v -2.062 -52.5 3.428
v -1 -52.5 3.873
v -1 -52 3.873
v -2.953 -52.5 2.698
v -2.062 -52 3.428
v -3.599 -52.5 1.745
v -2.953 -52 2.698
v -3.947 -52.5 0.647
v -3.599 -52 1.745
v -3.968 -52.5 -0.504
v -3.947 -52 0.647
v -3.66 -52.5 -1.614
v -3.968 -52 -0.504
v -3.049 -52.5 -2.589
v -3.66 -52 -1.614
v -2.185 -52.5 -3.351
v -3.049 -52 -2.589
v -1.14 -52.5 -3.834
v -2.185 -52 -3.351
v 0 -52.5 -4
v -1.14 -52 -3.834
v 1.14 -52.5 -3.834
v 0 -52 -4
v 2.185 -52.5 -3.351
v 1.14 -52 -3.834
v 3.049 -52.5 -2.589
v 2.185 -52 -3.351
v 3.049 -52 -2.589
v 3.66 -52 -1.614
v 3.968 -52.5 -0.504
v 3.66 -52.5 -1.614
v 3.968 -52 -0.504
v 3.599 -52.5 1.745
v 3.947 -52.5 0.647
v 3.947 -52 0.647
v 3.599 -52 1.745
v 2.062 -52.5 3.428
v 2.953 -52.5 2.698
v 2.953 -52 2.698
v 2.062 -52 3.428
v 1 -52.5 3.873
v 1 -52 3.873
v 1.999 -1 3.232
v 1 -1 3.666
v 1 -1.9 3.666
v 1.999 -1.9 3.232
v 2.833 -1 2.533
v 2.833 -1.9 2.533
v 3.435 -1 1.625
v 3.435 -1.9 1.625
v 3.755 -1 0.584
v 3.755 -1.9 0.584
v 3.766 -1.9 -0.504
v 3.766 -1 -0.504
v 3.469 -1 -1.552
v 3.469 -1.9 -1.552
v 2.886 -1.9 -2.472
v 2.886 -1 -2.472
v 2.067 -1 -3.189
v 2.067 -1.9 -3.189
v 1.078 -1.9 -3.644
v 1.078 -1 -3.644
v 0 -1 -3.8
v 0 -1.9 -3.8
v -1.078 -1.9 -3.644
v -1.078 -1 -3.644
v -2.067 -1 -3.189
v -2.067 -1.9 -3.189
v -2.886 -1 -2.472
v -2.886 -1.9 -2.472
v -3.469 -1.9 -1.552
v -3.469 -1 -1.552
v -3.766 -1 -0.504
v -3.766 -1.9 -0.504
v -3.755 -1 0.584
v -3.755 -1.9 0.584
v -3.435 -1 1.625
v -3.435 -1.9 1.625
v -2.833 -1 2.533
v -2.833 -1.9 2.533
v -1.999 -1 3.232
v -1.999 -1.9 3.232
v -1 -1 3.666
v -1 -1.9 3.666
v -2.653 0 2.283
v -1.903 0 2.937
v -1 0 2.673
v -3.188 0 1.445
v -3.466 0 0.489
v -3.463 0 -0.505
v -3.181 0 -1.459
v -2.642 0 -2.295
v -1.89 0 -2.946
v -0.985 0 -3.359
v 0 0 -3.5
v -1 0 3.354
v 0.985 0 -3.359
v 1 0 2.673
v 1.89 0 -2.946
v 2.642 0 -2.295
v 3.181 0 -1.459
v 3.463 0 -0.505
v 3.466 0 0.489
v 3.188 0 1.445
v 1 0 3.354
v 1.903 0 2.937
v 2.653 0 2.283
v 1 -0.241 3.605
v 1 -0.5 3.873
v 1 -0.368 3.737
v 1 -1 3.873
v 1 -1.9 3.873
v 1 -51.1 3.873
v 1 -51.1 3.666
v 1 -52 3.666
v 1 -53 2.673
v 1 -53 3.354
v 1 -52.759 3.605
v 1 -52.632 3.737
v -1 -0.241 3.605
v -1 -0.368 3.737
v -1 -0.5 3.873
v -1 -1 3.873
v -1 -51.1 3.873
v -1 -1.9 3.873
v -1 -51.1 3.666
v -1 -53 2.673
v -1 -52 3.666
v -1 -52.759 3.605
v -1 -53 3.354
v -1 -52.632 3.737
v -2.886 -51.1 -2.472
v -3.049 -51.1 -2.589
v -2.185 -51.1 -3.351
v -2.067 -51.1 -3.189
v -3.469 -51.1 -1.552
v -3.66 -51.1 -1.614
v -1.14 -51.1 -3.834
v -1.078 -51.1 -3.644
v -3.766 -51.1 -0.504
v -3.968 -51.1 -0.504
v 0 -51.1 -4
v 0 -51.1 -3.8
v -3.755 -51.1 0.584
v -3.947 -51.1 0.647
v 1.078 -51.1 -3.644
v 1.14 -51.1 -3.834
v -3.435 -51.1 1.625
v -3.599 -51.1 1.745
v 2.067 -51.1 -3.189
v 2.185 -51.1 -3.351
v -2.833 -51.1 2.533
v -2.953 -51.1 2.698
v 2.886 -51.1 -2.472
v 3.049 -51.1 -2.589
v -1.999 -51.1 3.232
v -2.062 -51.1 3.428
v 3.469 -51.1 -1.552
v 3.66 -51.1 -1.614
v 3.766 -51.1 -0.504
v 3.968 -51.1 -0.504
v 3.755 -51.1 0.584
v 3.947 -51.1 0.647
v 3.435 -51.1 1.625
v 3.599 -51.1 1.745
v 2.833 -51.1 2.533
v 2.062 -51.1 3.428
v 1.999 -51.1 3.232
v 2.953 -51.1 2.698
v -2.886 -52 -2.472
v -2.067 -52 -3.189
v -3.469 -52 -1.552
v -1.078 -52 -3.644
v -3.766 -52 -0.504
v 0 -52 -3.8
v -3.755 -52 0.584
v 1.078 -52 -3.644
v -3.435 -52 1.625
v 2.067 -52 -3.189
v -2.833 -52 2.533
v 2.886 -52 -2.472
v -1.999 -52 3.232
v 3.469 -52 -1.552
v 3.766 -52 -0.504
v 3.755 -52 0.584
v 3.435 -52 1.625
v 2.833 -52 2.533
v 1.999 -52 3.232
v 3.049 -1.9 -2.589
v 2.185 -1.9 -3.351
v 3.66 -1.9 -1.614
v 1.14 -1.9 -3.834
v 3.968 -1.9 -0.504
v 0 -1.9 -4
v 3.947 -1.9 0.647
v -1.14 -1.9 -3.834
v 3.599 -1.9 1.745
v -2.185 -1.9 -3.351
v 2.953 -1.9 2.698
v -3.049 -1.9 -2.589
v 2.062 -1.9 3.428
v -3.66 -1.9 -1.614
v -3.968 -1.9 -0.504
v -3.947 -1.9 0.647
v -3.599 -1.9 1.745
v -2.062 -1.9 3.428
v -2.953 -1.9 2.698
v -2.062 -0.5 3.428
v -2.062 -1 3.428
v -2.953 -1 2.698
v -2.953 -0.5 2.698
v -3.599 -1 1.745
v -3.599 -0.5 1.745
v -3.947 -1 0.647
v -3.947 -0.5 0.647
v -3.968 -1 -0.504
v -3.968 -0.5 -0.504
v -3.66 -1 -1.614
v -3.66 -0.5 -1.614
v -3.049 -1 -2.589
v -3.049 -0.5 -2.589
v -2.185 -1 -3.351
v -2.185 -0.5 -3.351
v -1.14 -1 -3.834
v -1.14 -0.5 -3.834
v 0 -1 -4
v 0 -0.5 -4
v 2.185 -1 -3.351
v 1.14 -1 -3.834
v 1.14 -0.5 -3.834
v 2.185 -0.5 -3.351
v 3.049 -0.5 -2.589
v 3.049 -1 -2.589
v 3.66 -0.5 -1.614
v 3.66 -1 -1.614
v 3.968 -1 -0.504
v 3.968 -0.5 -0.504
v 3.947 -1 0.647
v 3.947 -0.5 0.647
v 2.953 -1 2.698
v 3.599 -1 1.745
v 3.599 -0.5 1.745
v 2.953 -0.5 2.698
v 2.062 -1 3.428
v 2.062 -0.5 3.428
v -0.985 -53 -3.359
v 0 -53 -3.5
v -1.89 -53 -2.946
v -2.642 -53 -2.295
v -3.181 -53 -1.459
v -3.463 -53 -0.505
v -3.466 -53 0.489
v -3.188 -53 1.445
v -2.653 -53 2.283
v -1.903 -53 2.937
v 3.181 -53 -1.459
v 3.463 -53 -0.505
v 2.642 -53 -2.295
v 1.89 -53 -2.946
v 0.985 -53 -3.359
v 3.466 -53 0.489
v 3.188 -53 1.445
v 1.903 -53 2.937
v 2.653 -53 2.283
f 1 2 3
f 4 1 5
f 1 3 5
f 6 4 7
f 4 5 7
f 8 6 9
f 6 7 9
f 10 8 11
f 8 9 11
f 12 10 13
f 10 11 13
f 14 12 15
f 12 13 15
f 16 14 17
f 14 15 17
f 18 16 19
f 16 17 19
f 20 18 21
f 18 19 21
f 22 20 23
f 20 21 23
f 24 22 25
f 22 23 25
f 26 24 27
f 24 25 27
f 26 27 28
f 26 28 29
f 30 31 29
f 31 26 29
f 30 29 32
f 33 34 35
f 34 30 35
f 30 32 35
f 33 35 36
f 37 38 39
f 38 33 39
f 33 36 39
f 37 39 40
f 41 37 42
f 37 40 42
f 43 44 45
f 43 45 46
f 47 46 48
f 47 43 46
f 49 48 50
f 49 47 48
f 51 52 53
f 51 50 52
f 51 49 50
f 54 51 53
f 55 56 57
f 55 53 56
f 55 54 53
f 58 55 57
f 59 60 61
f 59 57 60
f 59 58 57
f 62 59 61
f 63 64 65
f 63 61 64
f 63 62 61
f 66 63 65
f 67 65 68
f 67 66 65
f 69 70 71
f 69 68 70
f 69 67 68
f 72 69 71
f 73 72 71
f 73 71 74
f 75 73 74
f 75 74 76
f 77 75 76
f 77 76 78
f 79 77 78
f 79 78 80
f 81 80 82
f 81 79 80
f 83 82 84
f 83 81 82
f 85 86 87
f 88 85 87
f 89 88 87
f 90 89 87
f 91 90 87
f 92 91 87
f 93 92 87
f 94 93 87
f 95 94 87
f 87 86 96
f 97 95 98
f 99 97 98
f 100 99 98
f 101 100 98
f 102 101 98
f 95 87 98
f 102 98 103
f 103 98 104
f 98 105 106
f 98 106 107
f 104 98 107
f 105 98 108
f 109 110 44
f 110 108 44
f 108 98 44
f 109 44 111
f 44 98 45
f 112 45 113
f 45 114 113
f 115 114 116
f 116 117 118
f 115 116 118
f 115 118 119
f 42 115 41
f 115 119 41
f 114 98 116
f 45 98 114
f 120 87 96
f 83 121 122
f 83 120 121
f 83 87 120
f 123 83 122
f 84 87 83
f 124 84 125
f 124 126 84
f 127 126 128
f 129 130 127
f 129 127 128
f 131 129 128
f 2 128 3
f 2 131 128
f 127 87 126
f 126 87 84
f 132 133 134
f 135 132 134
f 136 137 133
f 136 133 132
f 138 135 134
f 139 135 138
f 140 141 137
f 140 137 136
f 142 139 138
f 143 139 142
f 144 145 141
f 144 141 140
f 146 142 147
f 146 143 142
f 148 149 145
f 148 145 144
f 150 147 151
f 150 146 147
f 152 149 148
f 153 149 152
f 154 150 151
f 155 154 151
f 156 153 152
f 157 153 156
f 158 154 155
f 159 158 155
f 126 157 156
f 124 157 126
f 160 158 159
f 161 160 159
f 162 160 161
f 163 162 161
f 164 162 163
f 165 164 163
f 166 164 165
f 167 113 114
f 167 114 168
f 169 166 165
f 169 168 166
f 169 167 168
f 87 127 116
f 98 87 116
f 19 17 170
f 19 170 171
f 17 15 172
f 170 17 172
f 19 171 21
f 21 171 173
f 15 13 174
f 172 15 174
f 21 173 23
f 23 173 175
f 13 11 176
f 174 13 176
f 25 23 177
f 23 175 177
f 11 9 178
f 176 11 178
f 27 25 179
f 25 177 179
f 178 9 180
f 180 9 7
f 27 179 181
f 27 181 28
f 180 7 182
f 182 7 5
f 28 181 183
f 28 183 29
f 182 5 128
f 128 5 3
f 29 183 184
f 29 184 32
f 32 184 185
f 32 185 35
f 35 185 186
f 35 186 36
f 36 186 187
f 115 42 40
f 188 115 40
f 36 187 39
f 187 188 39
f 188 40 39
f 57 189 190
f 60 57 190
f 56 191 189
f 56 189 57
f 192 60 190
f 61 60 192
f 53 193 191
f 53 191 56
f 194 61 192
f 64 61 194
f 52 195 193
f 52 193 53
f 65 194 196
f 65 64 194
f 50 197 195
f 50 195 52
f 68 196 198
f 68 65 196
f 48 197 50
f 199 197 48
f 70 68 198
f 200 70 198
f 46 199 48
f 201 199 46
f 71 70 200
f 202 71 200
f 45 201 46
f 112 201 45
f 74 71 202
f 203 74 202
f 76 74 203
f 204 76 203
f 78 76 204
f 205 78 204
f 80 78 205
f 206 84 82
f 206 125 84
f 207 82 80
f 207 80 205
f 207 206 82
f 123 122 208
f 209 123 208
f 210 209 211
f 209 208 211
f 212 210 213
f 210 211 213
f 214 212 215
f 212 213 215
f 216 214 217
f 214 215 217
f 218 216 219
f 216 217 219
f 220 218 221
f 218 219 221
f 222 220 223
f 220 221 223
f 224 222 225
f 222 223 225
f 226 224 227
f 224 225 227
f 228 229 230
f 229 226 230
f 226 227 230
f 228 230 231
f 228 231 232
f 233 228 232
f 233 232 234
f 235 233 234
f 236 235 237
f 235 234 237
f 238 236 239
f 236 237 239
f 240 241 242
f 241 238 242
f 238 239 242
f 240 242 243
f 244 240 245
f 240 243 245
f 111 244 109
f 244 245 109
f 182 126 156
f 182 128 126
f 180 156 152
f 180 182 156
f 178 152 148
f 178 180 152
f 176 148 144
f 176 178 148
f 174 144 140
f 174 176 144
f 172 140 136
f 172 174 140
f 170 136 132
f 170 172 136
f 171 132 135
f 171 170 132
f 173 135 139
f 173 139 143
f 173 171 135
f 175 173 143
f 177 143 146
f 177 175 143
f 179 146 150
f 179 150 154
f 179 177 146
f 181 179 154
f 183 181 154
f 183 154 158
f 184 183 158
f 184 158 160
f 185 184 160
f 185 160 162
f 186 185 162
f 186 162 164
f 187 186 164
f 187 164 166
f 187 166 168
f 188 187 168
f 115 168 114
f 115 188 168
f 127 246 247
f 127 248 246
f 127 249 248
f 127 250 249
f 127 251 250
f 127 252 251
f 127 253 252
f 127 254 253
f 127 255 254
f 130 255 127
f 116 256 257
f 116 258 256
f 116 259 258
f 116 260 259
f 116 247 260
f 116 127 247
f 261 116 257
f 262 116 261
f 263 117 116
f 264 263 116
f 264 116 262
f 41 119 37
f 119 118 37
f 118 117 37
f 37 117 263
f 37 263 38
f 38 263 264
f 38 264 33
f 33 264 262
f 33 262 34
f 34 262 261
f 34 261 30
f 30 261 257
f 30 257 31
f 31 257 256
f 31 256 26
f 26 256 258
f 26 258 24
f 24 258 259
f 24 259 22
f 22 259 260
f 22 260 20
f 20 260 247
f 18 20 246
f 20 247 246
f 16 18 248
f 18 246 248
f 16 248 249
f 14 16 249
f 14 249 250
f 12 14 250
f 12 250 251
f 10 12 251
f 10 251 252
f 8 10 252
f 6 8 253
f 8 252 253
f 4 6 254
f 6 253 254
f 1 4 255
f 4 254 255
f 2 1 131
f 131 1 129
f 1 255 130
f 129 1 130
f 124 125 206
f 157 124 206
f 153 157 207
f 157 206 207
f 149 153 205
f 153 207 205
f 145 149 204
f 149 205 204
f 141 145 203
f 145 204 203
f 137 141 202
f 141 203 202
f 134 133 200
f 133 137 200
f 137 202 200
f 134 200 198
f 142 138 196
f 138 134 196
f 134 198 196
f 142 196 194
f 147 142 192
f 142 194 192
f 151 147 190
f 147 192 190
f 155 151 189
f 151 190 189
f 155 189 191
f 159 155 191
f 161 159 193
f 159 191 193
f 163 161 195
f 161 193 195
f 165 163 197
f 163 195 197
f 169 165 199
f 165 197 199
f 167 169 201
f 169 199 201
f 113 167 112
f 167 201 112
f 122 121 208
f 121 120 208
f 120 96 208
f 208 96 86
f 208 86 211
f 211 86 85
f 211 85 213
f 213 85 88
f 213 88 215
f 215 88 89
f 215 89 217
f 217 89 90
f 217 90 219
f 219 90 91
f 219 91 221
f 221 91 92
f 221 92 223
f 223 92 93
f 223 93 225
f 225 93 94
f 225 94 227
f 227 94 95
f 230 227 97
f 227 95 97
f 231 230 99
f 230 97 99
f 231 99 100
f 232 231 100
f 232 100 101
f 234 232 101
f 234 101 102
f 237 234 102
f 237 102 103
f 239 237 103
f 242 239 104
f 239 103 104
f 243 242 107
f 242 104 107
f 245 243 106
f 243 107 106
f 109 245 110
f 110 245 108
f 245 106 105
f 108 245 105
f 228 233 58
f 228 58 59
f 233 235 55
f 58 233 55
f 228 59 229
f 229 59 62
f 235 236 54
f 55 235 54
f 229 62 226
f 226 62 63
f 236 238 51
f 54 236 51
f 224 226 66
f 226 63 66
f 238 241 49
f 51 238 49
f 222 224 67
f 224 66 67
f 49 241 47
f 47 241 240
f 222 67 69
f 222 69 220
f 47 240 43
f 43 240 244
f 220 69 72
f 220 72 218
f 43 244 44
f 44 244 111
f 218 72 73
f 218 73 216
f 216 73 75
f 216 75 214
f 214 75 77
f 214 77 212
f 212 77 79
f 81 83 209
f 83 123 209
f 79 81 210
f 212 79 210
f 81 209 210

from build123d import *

# Parameters (mm, degrees)
F0_R      = 4
F1_DEPTH  = 53
F2_W      = 2
F2_H      = 2.6729833462
F3_DEPTH  = 53.001
F4_SIZE   = 0.5
F6_R      = 5.1282432724
F6_R_2    = 3.8
F7_DEPTH  = 0.9
F9_R      = 7.9440327168
F9_R_2    = 3.8
F10_DEPTH = 0.9


with BuildPart() as f1:
    # F0 (on Front) → F1 (new body)
    with BuildSketch(Plane.XZ):
        Circle(F0_R)
    extrude(amount=F1_DEPTH)

    # F2 (on face) → F3 (cut, through all)
    with BuildSketch(Plane.XZ.offset(53)):
        with Locations((0, 4.0094750193)):
            Rectangle(F2_W, F2_H)
    extrude(amount=-F3_DEPTH, mode=Mode.SUBTRACT)

    # F4
    f4_edges = [f1.edges().sort_by_distance(p)[0] for p in [
        (0, -53, -4),
        (0, 0, -4),
    ]]
    chamfer(f4_edges, length=F4_SIZE)

    # F6 (on offset) → F7 (cut)
    with BuildSketch(Plane.XZ.offset(52)):
        Circle(F6_R)
        Circle(F6_R_2, mode=Mode.SUBTRACT)
    extrude(amount=-F7_DEPTH, mode=Mode.SUBTRACT)

    # F9 (on offset) → F10 (cut)
    with BuildSketch(Plane(origin=(0, -1, 0), x_dir=(-1, 0, 0), z_dir=(0, 1, 0))):
        Circle(F9_R)
        Circle(F9_R_2, mode=Mode.SUBTRACT)
    extrude(amount=-F10_DEPTH, mode=Mode.SUBTRACT)


solid = f1.part
